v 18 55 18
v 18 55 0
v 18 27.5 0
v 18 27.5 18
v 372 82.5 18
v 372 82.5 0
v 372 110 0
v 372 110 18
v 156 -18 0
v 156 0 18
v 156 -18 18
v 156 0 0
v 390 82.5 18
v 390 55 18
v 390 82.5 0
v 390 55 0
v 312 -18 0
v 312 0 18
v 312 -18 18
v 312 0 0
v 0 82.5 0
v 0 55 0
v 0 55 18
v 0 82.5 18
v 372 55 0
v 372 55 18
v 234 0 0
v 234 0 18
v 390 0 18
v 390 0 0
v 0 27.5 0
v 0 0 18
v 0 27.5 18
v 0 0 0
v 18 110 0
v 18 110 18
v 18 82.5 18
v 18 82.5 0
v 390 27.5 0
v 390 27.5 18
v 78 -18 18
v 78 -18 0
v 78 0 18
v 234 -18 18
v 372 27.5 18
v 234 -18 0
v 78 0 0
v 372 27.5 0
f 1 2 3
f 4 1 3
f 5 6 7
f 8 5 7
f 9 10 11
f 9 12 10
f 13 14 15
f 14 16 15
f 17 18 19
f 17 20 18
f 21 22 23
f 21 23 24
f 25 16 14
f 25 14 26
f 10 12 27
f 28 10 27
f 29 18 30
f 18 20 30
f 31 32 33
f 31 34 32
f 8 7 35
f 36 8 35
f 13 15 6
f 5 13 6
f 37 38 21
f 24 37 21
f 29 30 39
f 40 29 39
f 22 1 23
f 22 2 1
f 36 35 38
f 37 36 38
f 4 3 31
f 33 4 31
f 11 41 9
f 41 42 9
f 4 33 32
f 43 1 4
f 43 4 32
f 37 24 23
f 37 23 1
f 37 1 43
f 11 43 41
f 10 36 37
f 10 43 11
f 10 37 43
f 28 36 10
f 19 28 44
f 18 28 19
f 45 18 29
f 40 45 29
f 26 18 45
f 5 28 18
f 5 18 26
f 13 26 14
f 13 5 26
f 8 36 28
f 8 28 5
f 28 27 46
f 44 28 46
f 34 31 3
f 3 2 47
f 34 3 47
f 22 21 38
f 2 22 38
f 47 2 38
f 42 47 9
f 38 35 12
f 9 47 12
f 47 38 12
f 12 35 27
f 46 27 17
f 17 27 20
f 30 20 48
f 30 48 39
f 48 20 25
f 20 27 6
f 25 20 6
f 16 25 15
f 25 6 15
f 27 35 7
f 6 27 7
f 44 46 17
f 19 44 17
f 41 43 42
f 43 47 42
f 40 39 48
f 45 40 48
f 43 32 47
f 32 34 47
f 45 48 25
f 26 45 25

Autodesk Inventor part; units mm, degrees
ref_plane "YZ Plane" through (0, 0, 0) normal (1, 0, 0) x (0, 1, 0)
ref_plane "XZ Plane" through (0, 0, 0) normal (0, 1, 0) x (-1, 0, 0)
ref_plane "XY Plane" through (0, 0, 0) normal (0, 0, 1) x (1, 0, 0)
sketch "Sketch1" plane through (0, 0, 0) normal (0, 0, 1) x (1, 0, 0)
  line L0 (372, 110) -> (18, 110)
  line L1 (78, 0) -> (78, -18)
  line L2 (156, 0) -> (156, -18)
  line L3 (234, 0) -> (234, -18)
  line L4 (312, 0) -> (312, -18)
  line L5 (78, -18) -> (156, -18)
  line L6 (234, -18) -> (312, -18)
  line L7 (156, 0) -> (234, 0)
  line L8 (18, 27.5) -> (0, 27.5)
  line L9 (18, 55) -> (0, 55)
  line L10 (18, 55) -> (0, 55)
  line L11 (18, 82.5) -> (0, 82.5)
  line L12 (390, 82.5) -> (372, 82.5)
  line L13 (390, 55) -> (372, 55)
  line L14 (390, 27.5) -> (372, 27.5)
  line L15 (0, 0) -> (0, 27.5)
  line L16 (0, 55) -> (0, 82.5)
  line L17 (390, 0) -> (390, 27.5)
  line L18 (390, 55) -> (390, 82.5)
  line L19 (372, 27.5) -> (372, 55)
  line L20 (372, 82.5) -> (372, 110)
  line L21 (18, 110) -> (18, 82.5)
  line L22 (18, 55) -> (18, 27.5)
  line L23 (312, 0) -> (390, 0)
  line L24 (0, 0) -> (78, 0)
  dimension "d7" = 78
  dimension "d8" = 78
  dimension "d9" = 78
  dimension "d11" = 18
  dimension "d12" = 18
  dimension "d13" = 18
  dimension "d24" = 18
  dimension "d25" = 18
  dimension "d26" = 18
  dimension "d28" = 18
  dimension "d32" = 18
  dimension "d33" = 18
  dimension "d35" = 78
  dimension "d36" = 78
  dimension "d39" = 27.5
  dimension "d40" = 27.5
  dimension "d41" = 27.5
  dimension "d42" = 27.5
  dimension "d48" = 27.5
  dimension "d49" = 27.5
  dimension "d50" = 27.5
  dimension "d51" = 27.5
  dimension "d52" = 110
extrude "Extrusion3" add sketch "Sketch1" along normal blind 18
properties part number "cajon lat"
